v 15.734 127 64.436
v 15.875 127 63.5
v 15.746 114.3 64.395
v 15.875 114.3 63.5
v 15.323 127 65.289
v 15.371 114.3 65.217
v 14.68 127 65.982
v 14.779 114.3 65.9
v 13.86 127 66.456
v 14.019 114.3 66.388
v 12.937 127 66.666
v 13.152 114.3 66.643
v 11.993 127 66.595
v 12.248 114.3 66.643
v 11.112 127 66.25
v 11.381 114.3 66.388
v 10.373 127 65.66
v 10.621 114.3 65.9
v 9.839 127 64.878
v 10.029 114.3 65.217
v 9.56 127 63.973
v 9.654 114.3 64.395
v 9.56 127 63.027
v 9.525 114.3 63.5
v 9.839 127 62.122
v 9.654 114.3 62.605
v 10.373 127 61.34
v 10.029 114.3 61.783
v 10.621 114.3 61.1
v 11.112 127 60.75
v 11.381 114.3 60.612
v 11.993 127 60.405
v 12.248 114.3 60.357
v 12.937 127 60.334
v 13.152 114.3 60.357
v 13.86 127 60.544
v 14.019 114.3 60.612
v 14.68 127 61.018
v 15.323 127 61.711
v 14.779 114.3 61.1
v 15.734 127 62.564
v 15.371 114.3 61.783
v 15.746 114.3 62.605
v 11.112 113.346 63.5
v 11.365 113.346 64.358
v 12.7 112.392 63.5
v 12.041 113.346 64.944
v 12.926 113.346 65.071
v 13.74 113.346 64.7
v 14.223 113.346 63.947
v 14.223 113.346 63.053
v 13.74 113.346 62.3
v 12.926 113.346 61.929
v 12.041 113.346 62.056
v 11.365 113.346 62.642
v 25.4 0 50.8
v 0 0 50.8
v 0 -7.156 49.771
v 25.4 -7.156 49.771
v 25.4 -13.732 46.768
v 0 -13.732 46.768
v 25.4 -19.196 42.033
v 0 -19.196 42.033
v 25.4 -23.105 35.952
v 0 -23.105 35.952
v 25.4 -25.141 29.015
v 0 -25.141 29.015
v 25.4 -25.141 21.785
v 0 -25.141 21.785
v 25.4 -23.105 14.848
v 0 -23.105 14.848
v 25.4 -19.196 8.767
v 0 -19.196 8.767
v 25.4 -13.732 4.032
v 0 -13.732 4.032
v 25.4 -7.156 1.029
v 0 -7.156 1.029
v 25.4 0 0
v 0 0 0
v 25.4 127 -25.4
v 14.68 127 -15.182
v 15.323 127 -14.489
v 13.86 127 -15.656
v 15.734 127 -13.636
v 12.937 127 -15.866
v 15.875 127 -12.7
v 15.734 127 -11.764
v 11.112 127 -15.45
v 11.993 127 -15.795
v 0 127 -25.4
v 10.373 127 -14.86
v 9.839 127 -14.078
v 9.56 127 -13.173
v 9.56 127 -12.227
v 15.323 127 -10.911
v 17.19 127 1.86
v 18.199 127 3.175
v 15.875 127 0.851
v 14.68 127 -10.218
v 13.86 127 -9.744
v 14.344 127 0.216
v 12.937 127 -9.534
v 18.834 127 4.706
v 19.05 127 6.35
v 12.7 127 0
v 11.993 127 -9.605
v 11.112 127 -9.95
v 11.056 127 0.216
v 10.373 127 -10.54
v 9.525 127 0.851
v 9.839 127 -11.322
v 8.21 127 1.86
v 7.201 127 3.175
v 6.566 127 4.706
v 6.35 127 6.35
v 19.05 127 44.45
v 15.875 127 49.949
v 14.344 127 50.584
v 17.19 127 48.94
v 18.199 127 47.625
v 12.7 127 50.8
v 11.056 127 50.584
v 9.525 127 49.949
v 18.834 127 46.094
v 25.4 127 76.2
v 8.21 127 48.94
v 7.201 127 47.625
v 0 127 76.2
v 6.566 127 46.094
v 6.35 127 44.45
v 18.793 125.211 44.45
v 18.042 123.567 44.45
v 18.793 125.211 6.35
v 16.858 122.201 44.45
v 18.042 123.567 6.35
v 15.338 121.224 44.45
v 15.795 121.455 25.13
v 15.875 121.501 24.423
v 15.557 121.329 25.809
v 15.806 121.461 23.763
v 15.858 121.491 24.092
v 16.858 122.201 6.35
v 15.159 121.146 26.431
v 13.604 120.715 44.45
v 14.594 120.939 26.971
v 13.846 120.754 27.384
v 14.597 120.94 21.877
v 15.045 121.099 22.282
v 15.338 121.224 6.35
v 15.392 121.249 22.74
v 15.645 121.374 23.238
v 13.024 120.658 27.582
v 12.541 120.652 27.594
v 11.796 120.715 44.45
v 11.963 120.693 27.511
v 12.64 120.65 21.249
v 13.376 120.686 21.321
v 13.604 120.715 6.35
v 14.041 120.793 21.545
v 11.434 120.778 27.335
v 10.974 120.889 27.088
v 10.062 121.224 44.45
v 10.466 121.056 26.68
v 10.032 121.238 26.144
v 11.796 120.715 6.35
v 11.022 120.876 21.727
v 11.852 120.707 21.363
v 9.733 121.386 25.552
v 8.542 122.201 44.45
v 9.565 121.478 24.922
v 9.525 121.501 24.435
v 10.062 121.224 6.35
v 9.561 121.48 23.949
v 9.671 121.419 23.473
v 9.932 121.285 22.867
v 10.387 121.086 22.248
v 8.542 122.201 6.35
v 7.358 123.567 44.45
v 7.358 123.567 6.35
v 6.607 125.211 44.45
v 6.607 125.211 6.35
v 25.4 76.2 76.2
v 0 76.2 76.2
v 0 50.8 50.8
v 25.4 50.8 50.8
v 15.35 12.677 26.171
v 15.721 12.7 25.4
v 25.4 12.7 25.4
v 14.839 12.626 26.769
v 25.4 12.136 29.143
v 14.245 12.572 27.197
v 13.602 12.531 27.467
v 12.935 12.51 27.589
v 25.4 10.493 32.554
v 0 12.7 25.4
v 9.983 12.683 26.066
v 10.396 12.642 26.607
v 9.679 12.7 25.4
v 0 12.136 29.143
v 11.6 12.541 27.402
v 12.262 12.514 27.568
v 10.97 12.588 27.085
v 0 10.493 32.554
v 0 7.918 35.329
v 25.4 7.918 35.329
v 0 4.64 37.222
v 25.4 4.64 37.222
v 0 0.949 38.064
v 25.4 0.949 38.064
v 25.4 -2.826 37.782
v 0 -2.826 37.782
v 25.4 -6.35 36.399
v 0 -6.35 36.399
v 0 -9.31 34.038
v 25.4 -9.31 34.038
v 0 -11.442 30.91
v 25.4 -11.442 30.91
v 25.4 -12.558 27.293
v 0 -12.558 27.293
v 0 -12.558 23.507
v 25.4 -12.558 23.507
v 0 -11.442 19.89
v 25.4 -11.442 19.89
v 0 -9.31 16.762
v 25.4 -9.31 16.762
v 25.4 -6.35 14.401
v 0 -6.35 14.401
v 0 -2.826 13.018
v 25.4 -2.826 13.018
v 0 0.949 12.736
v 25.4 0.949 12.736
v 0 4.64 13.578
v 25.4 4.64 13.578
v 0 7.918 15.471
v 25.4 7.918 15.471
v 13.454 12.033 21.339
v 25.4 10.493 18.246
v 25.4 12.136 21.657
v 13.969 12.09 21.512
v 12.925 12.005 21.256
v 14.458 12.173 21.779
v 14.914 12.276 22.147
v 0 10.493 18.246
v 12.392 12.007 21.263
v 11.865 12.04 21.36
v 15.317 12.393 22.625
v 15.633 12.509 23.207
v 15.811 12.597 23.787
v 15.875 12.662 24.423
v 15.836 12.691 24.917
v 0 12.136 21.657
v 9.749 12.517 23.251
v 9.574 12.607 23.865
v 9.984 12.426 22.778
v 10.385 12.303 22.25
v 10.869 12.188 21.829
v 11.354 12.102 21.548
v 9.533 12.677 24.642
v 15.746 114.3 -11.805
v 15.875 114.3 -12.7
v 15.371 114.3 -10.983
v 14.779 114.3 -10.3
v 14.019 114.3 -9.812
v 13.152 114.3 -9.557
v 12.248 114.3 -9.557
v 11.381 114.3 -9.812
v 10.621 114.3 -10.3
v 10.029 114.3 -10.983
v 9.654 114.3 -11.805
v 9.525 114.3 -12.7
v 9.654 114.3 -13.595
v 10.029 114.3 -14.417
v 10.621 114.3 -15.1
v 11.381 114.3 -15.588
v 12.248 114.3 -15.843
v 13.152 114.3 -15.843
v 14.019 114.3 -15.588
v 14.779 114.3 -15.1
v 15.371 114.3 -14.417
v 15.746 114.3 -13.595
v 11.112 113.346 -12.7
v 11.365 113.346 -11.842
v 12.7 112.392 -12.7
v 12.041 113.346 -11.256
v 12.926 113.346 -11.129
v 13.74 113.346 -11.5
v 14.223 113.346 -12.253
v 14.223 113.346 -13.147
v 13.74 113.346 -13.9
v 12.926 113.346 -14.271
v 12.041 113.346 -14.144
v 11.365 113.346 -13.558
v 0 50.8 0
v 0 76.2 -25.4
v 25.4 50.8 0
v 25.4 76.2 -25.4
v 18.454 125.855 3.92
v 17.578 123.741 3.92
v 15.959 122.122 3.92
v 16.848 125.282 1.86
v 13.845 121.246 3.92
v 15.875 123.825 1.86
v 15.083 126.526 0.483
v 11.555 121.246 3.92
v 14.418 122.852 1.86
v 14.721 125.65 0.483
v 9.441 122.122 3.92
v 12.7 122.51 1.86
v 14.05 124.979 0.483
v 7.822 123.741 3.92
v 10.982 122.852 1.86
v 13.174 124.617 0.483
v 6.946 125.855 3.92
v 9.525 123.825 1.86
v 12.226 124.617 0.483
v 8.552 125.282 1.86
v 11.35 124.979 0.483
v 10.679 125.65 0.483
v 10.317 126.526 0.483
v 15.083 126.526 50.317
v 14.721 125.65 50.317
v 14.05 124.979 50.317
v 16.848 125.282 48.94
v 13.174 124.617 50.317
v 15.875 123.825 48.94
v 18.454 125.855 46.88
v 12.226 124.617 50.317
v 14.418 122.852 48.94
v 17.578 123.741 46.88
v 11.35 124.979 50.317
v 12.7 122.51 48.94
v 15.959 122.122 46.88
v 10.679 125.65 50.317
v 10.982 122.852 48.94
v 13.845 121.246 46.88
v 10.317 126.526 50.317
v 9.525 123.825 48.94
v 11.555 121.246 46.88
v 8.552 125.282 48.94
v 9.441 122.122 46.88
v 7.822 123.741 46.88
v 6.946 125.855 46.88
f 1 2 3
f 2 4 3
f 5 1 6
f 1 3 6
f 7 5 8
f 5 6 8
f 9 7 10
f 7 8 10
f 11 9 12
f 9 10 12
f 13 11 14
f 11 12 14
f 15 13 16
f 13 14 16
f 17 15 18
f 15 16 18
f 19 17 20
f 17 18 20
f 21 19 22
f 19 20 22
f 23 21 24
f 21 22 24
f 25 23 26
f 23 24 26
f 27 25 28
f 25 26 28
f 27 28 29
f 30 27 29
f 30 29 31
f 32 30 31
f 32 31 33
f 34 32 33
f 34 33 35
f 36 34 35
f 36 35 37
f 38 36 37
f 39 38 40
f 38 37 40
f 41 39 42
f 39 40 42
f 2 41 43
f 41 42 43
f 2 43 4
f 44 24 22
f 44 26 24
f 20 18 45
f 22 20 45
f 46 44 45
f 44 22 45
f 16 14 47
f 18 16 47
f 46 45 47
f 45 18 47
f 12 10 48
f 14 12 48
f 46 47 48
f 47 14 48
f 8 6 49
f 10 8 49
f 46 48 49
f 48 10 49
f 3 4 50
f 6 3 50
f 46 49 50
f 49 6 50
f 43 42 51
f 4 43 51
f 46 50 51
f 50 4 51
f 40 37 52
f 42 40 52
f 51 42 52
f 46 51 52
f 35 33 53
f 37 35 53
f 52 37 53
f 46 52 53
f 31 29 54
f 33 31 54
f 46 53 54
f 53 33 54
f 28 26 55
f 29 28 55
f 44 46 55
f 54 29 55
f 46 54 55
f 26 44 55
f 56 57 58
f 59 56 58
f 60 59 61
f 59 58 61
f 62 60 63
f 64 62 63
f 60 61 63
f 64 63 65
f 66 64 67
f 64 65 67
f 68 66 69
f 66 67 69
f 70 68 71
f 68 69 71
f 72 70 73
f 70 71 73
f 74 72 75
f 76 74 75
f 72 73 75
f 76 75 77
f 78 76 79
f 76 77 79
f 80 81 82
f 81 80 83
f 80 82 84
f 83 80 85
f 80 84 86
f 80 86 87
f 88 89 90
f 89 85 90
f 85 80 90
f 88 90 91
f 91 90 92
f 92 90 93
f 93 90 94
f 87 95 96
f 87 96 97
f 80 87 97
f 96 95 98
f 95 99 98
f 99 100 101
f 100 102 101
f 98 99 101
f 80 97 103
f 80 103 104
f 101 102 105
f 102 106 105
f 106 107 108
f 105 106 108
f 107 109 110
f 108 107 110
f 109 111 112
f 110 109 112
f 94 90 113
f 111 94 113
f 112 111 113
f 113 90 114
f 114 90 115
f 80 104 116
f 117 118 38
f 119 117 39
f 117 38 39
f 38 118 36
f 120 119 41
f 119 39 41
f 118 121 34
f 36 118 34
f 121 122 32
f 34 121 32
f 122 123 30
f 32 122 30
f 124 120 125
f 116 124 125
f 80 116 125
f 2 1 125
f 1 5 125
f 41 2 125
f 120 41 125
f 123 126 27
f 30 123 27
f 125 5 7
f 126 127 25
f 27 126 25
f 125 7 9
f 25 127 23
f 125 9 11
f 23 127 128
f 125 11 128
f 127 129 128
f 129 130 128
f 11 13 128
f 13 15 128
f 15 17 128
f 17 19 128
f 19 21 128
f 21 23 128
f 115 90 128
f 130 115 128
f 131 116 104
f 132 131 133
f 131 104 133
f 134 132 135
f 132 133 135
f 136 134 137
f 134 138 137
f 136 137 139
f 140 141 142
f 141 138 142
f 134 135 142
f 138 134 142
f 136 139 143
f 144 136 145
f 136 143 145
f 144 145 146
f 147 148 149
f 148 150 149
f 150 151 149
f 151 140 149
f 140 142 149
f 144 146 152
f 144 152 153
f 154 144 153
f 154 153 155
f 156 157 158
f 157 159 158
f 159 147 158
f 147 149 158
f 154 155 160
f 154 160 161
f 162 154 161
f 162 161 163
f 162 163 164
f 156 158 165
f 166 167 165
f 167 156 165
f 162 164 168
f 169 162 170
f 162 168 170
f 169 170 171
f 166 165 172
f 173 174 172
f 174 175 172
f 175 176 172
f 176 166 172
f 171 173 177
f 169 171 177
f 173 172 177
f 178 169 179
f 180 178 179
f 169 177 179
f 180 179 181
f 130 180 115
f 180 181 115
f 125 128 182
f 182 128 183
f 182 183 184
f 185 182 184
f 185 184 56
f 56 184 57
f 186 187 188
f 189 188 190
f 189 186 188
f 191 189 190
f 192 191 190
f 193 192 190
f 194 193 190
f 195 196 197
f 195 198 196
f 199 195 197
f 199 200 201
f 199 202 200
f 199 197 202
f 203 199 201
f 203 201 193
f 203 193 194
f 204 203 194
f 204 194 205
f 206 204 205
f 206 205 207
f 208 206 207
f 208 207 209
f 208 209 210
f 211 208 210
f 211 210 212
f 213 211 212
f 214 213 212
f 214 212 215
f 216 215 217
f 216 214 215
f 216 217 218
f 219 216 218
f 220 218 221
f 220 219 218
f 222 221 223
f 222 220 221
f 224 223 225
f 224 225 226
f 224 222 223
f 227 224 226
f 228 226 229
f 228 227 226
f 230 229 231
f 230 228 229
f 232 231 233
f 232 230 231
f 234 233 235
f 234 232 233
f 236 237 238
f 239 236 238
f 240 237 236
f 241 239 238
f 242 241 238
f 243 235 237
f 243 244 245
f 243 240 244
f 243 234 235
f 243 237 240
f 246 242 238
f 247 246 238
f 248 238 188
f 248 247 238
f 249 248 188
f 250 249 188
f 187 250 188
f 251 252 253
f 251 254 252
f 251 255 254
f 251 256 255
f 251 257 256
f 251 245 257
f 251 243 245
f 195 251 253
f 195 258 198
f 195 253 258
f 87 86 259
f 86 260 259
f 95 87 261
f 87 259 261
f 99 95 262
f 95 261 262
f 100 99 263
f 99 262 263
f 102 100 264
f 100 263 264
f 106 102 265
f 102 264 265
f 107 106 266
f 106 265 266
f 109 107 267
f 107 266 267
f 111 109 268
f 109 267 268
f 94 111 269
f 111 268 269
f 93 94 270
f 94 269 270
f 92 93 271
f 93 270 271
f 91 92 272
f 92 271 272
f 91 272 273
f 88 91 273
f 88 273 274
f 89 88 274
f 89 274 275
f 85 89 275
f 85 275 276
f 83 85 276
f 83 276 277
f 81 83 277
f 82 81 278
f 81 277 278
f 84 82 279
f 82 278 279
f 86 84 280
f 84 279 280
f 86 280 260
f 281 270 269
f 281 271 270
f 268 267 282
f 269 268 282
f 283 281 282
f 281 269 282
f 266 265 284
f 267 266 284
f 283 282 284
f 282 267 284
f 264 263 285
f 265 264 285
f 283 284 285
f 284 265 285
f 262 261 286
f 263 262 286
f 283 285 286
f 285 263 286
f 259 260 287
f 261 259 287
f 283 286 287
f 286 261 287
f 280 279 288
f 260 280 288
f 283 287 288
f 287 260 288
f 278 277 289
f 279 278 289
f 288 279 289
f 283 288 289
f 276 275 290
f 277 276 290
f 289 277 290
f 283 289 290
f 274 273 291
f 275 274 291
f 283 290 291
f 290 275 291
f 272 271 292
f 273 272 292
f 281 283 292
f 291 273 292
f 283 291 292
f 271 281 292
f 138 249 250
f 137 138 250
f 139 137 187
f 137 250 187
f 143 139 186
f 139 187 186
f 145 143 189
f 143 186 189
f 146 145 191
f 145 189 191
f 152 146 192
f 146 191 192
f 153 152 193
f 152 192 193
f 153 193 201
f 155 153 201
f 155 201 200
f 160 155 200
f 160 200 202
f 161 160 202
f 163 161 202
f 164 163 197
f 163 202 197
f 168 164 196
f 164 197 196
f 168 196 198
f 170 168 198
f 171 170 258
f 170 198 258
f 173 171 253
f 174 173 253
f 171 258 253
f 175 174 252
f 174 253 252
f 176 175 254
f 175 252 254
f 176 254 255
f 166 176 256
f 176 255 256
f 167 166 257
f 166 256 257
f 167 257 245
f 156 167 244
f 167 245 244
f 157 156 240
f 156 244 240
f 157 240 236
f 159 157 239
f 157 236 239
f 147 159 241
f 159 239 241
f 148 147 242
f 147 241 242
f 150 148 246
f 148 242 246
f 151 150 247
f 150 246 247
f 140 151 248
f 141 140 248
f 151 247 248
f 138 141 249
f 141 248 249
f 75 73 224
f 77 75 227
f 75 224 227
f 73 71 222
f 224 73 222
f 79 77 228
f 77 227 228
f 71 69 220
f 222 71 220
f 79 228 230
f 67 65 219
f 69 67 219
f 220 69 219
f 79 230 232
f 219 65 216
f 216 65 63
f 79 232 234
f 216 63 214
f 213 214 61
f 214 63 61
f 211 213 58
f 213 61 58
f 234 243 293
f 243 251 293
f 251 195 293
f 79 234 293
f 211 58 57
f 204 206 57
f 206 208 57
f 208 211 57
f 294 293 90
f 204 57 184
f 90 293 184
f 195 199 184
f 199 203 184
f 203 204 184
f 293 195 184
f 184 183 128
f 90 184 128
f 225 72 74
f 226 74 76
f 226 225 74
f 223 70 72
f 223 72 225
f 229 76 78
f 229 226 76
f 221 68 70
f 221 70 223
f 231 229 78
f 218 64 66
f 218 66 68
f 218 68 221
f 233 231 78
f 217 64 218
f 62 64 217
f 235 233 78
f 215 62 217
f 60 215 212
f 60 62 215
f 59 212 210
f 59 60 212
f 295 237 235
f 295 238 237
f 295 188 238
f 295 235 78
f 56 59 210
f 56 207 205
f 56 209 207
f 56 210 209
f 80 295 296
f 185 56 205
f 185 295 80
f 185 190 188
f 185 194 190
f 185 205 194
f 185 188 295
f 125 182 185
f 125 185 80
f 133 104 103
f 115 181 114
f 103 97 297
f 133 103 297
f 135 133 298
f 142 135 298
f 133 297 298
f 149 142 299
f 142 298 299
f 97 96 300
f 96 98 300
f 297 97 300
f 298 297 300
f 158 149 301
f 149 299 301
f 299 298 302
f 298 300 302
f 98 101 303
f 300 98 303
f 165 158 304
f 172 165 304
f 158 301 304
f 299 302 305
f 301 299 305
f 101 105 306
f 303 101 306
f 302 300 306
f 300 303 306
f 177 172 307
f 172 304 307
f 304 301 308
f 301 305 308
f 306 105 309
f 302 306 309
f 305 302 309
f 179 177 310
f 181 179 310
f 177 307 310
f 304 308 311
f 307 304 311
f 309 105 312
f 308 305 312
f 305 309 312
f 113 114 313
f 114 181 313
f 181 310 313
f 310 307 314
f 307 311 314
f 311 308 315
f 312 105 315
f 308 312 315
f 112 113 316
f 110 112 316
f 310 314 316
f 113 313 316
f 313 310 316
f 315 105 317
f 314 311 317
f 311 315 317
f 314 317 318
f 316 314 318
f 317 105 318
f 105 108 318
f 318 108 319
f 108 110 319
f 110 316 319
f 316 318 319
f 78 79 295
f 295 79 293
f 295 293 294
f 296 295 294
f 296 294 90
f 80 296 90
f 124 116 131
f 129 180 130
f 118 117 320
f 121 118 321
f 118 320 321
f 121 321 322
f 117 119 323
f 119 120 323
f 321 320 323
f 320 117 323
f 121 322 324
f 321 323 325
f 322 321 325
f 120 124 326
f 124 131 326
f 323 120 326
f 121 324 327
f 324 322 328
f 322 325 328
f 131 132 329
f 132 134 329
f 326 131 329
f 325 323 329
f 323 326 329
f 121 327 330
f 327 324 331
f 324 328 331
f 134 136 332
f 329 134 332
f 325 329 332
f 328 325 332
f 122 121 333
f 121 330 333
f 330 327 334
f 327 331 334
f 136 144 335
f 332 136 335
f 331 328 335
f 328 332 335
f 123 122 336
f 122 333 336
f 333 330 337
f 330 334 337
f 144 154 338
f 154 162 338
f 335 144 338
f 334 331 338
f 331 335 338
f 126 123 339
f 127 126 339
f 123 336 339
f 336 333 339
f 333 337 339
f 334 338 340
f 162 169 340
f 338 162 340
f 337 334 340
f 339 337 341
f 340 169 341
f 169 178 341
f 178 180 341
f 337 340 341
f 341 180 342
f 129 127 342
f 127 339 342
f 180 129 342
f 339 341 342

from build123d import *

# Parameters (mm, degrees)
F0_R     = 12.7
F1_DEPTH = 25.4
F5_D     = 6.35
F5_DEPTH = 12.7
F5_TIP   = 1.9077324654
F7_D     = 6.35
F7_DEPTH = 127
F7_START = 6.3500001
F7_TIP   = 1.9077324654


with BuildPart() as f1:
    # F0 (on Right) → F1 (new body)
    with BuildSketch(Plane.YZ):
        with BuildLine():
            Line((50.8, 50.8), (0, 50.8))
            ThreePointArc((0, 50.8), (-25.4, 25.4), (0, 0))
            Line((0, 0), (50.8, 0))
            Line((50.8, 0), (76.2, -25.4))
            Line((76.2, -25.4), (127, -25.4))
            Line((127, -25.4), (127, 76.2))
            Line((127, 76.2), (76.2, 76.2))
            Line((76.2, 76.2), (50.8, 50.8))
        make_face()
        with Locations((0, 25.4)):
            Circle(F0_R, mode=Mode.SUBTRACT)
    extrude(amount=F1_DEPTH)

    # F2 (on face) → F3 (revolve, cut)
    with BuildSketch(Plane(origin=(0, 127, 0), x_dir=(-1, 0, 0), z_dir=(0, 1, 0))):
        with BuildLine():
            ThreePointArc((-12.7, 50.8), (-17.1901280605, 48.9401280605), (-19.05, 44.45))
            Line((-19.05, 44.45), (-19.05, 6.35))
            ThreePointArc((-19.05, 6.35), (-17.1901280605, 1.8598719395), (-12.7, 0))
            Line((-12.7, 0), (-12.7, 50.8))
        make_face()
    revolve(axis=Axis((12.7, 127, 25.4), (0, 0, -1)), mode=Mode.SUBTRACT)

    # F5
    with Locations(Plane(origin=(0, 127, 0), x_dir=(-1, 0, 0), z_dir=(0, 1, 0))):
        with Locations((-12.7, 63.5), (-12.7, -12.7)):
            Hole(F5_D / 2, depth=F5_DEPTH)
            with Locations((0, 0, -(F5_DEPTH + F5_TIP / 2))):  # 118° drill point
                Cone(0, F5_D / 2, F5_TIP, mode=Mode.SUBTRACT)

    # F7
    # its depths count from where the whole tool has entered the part; down to there all is cleared
    with Locations(Plane(origin=(0, 127, 0), x_dir=(-1, 0, 0), z_dir=(0, 1, 0)).offset(-F7_START)):
        with Locations((-12.7, 24.4230292737)):
            Hole(F7_D / 2, depth=F7_DEPTH)
            with Locations((0, 0, -(F7_DEPTH + F7_TIP / 2))):  # 118° drill point
                Cone(0, F7_D / 2, F7_TIP, mode=Mode.SUBTRACT)


solid = f1.part
